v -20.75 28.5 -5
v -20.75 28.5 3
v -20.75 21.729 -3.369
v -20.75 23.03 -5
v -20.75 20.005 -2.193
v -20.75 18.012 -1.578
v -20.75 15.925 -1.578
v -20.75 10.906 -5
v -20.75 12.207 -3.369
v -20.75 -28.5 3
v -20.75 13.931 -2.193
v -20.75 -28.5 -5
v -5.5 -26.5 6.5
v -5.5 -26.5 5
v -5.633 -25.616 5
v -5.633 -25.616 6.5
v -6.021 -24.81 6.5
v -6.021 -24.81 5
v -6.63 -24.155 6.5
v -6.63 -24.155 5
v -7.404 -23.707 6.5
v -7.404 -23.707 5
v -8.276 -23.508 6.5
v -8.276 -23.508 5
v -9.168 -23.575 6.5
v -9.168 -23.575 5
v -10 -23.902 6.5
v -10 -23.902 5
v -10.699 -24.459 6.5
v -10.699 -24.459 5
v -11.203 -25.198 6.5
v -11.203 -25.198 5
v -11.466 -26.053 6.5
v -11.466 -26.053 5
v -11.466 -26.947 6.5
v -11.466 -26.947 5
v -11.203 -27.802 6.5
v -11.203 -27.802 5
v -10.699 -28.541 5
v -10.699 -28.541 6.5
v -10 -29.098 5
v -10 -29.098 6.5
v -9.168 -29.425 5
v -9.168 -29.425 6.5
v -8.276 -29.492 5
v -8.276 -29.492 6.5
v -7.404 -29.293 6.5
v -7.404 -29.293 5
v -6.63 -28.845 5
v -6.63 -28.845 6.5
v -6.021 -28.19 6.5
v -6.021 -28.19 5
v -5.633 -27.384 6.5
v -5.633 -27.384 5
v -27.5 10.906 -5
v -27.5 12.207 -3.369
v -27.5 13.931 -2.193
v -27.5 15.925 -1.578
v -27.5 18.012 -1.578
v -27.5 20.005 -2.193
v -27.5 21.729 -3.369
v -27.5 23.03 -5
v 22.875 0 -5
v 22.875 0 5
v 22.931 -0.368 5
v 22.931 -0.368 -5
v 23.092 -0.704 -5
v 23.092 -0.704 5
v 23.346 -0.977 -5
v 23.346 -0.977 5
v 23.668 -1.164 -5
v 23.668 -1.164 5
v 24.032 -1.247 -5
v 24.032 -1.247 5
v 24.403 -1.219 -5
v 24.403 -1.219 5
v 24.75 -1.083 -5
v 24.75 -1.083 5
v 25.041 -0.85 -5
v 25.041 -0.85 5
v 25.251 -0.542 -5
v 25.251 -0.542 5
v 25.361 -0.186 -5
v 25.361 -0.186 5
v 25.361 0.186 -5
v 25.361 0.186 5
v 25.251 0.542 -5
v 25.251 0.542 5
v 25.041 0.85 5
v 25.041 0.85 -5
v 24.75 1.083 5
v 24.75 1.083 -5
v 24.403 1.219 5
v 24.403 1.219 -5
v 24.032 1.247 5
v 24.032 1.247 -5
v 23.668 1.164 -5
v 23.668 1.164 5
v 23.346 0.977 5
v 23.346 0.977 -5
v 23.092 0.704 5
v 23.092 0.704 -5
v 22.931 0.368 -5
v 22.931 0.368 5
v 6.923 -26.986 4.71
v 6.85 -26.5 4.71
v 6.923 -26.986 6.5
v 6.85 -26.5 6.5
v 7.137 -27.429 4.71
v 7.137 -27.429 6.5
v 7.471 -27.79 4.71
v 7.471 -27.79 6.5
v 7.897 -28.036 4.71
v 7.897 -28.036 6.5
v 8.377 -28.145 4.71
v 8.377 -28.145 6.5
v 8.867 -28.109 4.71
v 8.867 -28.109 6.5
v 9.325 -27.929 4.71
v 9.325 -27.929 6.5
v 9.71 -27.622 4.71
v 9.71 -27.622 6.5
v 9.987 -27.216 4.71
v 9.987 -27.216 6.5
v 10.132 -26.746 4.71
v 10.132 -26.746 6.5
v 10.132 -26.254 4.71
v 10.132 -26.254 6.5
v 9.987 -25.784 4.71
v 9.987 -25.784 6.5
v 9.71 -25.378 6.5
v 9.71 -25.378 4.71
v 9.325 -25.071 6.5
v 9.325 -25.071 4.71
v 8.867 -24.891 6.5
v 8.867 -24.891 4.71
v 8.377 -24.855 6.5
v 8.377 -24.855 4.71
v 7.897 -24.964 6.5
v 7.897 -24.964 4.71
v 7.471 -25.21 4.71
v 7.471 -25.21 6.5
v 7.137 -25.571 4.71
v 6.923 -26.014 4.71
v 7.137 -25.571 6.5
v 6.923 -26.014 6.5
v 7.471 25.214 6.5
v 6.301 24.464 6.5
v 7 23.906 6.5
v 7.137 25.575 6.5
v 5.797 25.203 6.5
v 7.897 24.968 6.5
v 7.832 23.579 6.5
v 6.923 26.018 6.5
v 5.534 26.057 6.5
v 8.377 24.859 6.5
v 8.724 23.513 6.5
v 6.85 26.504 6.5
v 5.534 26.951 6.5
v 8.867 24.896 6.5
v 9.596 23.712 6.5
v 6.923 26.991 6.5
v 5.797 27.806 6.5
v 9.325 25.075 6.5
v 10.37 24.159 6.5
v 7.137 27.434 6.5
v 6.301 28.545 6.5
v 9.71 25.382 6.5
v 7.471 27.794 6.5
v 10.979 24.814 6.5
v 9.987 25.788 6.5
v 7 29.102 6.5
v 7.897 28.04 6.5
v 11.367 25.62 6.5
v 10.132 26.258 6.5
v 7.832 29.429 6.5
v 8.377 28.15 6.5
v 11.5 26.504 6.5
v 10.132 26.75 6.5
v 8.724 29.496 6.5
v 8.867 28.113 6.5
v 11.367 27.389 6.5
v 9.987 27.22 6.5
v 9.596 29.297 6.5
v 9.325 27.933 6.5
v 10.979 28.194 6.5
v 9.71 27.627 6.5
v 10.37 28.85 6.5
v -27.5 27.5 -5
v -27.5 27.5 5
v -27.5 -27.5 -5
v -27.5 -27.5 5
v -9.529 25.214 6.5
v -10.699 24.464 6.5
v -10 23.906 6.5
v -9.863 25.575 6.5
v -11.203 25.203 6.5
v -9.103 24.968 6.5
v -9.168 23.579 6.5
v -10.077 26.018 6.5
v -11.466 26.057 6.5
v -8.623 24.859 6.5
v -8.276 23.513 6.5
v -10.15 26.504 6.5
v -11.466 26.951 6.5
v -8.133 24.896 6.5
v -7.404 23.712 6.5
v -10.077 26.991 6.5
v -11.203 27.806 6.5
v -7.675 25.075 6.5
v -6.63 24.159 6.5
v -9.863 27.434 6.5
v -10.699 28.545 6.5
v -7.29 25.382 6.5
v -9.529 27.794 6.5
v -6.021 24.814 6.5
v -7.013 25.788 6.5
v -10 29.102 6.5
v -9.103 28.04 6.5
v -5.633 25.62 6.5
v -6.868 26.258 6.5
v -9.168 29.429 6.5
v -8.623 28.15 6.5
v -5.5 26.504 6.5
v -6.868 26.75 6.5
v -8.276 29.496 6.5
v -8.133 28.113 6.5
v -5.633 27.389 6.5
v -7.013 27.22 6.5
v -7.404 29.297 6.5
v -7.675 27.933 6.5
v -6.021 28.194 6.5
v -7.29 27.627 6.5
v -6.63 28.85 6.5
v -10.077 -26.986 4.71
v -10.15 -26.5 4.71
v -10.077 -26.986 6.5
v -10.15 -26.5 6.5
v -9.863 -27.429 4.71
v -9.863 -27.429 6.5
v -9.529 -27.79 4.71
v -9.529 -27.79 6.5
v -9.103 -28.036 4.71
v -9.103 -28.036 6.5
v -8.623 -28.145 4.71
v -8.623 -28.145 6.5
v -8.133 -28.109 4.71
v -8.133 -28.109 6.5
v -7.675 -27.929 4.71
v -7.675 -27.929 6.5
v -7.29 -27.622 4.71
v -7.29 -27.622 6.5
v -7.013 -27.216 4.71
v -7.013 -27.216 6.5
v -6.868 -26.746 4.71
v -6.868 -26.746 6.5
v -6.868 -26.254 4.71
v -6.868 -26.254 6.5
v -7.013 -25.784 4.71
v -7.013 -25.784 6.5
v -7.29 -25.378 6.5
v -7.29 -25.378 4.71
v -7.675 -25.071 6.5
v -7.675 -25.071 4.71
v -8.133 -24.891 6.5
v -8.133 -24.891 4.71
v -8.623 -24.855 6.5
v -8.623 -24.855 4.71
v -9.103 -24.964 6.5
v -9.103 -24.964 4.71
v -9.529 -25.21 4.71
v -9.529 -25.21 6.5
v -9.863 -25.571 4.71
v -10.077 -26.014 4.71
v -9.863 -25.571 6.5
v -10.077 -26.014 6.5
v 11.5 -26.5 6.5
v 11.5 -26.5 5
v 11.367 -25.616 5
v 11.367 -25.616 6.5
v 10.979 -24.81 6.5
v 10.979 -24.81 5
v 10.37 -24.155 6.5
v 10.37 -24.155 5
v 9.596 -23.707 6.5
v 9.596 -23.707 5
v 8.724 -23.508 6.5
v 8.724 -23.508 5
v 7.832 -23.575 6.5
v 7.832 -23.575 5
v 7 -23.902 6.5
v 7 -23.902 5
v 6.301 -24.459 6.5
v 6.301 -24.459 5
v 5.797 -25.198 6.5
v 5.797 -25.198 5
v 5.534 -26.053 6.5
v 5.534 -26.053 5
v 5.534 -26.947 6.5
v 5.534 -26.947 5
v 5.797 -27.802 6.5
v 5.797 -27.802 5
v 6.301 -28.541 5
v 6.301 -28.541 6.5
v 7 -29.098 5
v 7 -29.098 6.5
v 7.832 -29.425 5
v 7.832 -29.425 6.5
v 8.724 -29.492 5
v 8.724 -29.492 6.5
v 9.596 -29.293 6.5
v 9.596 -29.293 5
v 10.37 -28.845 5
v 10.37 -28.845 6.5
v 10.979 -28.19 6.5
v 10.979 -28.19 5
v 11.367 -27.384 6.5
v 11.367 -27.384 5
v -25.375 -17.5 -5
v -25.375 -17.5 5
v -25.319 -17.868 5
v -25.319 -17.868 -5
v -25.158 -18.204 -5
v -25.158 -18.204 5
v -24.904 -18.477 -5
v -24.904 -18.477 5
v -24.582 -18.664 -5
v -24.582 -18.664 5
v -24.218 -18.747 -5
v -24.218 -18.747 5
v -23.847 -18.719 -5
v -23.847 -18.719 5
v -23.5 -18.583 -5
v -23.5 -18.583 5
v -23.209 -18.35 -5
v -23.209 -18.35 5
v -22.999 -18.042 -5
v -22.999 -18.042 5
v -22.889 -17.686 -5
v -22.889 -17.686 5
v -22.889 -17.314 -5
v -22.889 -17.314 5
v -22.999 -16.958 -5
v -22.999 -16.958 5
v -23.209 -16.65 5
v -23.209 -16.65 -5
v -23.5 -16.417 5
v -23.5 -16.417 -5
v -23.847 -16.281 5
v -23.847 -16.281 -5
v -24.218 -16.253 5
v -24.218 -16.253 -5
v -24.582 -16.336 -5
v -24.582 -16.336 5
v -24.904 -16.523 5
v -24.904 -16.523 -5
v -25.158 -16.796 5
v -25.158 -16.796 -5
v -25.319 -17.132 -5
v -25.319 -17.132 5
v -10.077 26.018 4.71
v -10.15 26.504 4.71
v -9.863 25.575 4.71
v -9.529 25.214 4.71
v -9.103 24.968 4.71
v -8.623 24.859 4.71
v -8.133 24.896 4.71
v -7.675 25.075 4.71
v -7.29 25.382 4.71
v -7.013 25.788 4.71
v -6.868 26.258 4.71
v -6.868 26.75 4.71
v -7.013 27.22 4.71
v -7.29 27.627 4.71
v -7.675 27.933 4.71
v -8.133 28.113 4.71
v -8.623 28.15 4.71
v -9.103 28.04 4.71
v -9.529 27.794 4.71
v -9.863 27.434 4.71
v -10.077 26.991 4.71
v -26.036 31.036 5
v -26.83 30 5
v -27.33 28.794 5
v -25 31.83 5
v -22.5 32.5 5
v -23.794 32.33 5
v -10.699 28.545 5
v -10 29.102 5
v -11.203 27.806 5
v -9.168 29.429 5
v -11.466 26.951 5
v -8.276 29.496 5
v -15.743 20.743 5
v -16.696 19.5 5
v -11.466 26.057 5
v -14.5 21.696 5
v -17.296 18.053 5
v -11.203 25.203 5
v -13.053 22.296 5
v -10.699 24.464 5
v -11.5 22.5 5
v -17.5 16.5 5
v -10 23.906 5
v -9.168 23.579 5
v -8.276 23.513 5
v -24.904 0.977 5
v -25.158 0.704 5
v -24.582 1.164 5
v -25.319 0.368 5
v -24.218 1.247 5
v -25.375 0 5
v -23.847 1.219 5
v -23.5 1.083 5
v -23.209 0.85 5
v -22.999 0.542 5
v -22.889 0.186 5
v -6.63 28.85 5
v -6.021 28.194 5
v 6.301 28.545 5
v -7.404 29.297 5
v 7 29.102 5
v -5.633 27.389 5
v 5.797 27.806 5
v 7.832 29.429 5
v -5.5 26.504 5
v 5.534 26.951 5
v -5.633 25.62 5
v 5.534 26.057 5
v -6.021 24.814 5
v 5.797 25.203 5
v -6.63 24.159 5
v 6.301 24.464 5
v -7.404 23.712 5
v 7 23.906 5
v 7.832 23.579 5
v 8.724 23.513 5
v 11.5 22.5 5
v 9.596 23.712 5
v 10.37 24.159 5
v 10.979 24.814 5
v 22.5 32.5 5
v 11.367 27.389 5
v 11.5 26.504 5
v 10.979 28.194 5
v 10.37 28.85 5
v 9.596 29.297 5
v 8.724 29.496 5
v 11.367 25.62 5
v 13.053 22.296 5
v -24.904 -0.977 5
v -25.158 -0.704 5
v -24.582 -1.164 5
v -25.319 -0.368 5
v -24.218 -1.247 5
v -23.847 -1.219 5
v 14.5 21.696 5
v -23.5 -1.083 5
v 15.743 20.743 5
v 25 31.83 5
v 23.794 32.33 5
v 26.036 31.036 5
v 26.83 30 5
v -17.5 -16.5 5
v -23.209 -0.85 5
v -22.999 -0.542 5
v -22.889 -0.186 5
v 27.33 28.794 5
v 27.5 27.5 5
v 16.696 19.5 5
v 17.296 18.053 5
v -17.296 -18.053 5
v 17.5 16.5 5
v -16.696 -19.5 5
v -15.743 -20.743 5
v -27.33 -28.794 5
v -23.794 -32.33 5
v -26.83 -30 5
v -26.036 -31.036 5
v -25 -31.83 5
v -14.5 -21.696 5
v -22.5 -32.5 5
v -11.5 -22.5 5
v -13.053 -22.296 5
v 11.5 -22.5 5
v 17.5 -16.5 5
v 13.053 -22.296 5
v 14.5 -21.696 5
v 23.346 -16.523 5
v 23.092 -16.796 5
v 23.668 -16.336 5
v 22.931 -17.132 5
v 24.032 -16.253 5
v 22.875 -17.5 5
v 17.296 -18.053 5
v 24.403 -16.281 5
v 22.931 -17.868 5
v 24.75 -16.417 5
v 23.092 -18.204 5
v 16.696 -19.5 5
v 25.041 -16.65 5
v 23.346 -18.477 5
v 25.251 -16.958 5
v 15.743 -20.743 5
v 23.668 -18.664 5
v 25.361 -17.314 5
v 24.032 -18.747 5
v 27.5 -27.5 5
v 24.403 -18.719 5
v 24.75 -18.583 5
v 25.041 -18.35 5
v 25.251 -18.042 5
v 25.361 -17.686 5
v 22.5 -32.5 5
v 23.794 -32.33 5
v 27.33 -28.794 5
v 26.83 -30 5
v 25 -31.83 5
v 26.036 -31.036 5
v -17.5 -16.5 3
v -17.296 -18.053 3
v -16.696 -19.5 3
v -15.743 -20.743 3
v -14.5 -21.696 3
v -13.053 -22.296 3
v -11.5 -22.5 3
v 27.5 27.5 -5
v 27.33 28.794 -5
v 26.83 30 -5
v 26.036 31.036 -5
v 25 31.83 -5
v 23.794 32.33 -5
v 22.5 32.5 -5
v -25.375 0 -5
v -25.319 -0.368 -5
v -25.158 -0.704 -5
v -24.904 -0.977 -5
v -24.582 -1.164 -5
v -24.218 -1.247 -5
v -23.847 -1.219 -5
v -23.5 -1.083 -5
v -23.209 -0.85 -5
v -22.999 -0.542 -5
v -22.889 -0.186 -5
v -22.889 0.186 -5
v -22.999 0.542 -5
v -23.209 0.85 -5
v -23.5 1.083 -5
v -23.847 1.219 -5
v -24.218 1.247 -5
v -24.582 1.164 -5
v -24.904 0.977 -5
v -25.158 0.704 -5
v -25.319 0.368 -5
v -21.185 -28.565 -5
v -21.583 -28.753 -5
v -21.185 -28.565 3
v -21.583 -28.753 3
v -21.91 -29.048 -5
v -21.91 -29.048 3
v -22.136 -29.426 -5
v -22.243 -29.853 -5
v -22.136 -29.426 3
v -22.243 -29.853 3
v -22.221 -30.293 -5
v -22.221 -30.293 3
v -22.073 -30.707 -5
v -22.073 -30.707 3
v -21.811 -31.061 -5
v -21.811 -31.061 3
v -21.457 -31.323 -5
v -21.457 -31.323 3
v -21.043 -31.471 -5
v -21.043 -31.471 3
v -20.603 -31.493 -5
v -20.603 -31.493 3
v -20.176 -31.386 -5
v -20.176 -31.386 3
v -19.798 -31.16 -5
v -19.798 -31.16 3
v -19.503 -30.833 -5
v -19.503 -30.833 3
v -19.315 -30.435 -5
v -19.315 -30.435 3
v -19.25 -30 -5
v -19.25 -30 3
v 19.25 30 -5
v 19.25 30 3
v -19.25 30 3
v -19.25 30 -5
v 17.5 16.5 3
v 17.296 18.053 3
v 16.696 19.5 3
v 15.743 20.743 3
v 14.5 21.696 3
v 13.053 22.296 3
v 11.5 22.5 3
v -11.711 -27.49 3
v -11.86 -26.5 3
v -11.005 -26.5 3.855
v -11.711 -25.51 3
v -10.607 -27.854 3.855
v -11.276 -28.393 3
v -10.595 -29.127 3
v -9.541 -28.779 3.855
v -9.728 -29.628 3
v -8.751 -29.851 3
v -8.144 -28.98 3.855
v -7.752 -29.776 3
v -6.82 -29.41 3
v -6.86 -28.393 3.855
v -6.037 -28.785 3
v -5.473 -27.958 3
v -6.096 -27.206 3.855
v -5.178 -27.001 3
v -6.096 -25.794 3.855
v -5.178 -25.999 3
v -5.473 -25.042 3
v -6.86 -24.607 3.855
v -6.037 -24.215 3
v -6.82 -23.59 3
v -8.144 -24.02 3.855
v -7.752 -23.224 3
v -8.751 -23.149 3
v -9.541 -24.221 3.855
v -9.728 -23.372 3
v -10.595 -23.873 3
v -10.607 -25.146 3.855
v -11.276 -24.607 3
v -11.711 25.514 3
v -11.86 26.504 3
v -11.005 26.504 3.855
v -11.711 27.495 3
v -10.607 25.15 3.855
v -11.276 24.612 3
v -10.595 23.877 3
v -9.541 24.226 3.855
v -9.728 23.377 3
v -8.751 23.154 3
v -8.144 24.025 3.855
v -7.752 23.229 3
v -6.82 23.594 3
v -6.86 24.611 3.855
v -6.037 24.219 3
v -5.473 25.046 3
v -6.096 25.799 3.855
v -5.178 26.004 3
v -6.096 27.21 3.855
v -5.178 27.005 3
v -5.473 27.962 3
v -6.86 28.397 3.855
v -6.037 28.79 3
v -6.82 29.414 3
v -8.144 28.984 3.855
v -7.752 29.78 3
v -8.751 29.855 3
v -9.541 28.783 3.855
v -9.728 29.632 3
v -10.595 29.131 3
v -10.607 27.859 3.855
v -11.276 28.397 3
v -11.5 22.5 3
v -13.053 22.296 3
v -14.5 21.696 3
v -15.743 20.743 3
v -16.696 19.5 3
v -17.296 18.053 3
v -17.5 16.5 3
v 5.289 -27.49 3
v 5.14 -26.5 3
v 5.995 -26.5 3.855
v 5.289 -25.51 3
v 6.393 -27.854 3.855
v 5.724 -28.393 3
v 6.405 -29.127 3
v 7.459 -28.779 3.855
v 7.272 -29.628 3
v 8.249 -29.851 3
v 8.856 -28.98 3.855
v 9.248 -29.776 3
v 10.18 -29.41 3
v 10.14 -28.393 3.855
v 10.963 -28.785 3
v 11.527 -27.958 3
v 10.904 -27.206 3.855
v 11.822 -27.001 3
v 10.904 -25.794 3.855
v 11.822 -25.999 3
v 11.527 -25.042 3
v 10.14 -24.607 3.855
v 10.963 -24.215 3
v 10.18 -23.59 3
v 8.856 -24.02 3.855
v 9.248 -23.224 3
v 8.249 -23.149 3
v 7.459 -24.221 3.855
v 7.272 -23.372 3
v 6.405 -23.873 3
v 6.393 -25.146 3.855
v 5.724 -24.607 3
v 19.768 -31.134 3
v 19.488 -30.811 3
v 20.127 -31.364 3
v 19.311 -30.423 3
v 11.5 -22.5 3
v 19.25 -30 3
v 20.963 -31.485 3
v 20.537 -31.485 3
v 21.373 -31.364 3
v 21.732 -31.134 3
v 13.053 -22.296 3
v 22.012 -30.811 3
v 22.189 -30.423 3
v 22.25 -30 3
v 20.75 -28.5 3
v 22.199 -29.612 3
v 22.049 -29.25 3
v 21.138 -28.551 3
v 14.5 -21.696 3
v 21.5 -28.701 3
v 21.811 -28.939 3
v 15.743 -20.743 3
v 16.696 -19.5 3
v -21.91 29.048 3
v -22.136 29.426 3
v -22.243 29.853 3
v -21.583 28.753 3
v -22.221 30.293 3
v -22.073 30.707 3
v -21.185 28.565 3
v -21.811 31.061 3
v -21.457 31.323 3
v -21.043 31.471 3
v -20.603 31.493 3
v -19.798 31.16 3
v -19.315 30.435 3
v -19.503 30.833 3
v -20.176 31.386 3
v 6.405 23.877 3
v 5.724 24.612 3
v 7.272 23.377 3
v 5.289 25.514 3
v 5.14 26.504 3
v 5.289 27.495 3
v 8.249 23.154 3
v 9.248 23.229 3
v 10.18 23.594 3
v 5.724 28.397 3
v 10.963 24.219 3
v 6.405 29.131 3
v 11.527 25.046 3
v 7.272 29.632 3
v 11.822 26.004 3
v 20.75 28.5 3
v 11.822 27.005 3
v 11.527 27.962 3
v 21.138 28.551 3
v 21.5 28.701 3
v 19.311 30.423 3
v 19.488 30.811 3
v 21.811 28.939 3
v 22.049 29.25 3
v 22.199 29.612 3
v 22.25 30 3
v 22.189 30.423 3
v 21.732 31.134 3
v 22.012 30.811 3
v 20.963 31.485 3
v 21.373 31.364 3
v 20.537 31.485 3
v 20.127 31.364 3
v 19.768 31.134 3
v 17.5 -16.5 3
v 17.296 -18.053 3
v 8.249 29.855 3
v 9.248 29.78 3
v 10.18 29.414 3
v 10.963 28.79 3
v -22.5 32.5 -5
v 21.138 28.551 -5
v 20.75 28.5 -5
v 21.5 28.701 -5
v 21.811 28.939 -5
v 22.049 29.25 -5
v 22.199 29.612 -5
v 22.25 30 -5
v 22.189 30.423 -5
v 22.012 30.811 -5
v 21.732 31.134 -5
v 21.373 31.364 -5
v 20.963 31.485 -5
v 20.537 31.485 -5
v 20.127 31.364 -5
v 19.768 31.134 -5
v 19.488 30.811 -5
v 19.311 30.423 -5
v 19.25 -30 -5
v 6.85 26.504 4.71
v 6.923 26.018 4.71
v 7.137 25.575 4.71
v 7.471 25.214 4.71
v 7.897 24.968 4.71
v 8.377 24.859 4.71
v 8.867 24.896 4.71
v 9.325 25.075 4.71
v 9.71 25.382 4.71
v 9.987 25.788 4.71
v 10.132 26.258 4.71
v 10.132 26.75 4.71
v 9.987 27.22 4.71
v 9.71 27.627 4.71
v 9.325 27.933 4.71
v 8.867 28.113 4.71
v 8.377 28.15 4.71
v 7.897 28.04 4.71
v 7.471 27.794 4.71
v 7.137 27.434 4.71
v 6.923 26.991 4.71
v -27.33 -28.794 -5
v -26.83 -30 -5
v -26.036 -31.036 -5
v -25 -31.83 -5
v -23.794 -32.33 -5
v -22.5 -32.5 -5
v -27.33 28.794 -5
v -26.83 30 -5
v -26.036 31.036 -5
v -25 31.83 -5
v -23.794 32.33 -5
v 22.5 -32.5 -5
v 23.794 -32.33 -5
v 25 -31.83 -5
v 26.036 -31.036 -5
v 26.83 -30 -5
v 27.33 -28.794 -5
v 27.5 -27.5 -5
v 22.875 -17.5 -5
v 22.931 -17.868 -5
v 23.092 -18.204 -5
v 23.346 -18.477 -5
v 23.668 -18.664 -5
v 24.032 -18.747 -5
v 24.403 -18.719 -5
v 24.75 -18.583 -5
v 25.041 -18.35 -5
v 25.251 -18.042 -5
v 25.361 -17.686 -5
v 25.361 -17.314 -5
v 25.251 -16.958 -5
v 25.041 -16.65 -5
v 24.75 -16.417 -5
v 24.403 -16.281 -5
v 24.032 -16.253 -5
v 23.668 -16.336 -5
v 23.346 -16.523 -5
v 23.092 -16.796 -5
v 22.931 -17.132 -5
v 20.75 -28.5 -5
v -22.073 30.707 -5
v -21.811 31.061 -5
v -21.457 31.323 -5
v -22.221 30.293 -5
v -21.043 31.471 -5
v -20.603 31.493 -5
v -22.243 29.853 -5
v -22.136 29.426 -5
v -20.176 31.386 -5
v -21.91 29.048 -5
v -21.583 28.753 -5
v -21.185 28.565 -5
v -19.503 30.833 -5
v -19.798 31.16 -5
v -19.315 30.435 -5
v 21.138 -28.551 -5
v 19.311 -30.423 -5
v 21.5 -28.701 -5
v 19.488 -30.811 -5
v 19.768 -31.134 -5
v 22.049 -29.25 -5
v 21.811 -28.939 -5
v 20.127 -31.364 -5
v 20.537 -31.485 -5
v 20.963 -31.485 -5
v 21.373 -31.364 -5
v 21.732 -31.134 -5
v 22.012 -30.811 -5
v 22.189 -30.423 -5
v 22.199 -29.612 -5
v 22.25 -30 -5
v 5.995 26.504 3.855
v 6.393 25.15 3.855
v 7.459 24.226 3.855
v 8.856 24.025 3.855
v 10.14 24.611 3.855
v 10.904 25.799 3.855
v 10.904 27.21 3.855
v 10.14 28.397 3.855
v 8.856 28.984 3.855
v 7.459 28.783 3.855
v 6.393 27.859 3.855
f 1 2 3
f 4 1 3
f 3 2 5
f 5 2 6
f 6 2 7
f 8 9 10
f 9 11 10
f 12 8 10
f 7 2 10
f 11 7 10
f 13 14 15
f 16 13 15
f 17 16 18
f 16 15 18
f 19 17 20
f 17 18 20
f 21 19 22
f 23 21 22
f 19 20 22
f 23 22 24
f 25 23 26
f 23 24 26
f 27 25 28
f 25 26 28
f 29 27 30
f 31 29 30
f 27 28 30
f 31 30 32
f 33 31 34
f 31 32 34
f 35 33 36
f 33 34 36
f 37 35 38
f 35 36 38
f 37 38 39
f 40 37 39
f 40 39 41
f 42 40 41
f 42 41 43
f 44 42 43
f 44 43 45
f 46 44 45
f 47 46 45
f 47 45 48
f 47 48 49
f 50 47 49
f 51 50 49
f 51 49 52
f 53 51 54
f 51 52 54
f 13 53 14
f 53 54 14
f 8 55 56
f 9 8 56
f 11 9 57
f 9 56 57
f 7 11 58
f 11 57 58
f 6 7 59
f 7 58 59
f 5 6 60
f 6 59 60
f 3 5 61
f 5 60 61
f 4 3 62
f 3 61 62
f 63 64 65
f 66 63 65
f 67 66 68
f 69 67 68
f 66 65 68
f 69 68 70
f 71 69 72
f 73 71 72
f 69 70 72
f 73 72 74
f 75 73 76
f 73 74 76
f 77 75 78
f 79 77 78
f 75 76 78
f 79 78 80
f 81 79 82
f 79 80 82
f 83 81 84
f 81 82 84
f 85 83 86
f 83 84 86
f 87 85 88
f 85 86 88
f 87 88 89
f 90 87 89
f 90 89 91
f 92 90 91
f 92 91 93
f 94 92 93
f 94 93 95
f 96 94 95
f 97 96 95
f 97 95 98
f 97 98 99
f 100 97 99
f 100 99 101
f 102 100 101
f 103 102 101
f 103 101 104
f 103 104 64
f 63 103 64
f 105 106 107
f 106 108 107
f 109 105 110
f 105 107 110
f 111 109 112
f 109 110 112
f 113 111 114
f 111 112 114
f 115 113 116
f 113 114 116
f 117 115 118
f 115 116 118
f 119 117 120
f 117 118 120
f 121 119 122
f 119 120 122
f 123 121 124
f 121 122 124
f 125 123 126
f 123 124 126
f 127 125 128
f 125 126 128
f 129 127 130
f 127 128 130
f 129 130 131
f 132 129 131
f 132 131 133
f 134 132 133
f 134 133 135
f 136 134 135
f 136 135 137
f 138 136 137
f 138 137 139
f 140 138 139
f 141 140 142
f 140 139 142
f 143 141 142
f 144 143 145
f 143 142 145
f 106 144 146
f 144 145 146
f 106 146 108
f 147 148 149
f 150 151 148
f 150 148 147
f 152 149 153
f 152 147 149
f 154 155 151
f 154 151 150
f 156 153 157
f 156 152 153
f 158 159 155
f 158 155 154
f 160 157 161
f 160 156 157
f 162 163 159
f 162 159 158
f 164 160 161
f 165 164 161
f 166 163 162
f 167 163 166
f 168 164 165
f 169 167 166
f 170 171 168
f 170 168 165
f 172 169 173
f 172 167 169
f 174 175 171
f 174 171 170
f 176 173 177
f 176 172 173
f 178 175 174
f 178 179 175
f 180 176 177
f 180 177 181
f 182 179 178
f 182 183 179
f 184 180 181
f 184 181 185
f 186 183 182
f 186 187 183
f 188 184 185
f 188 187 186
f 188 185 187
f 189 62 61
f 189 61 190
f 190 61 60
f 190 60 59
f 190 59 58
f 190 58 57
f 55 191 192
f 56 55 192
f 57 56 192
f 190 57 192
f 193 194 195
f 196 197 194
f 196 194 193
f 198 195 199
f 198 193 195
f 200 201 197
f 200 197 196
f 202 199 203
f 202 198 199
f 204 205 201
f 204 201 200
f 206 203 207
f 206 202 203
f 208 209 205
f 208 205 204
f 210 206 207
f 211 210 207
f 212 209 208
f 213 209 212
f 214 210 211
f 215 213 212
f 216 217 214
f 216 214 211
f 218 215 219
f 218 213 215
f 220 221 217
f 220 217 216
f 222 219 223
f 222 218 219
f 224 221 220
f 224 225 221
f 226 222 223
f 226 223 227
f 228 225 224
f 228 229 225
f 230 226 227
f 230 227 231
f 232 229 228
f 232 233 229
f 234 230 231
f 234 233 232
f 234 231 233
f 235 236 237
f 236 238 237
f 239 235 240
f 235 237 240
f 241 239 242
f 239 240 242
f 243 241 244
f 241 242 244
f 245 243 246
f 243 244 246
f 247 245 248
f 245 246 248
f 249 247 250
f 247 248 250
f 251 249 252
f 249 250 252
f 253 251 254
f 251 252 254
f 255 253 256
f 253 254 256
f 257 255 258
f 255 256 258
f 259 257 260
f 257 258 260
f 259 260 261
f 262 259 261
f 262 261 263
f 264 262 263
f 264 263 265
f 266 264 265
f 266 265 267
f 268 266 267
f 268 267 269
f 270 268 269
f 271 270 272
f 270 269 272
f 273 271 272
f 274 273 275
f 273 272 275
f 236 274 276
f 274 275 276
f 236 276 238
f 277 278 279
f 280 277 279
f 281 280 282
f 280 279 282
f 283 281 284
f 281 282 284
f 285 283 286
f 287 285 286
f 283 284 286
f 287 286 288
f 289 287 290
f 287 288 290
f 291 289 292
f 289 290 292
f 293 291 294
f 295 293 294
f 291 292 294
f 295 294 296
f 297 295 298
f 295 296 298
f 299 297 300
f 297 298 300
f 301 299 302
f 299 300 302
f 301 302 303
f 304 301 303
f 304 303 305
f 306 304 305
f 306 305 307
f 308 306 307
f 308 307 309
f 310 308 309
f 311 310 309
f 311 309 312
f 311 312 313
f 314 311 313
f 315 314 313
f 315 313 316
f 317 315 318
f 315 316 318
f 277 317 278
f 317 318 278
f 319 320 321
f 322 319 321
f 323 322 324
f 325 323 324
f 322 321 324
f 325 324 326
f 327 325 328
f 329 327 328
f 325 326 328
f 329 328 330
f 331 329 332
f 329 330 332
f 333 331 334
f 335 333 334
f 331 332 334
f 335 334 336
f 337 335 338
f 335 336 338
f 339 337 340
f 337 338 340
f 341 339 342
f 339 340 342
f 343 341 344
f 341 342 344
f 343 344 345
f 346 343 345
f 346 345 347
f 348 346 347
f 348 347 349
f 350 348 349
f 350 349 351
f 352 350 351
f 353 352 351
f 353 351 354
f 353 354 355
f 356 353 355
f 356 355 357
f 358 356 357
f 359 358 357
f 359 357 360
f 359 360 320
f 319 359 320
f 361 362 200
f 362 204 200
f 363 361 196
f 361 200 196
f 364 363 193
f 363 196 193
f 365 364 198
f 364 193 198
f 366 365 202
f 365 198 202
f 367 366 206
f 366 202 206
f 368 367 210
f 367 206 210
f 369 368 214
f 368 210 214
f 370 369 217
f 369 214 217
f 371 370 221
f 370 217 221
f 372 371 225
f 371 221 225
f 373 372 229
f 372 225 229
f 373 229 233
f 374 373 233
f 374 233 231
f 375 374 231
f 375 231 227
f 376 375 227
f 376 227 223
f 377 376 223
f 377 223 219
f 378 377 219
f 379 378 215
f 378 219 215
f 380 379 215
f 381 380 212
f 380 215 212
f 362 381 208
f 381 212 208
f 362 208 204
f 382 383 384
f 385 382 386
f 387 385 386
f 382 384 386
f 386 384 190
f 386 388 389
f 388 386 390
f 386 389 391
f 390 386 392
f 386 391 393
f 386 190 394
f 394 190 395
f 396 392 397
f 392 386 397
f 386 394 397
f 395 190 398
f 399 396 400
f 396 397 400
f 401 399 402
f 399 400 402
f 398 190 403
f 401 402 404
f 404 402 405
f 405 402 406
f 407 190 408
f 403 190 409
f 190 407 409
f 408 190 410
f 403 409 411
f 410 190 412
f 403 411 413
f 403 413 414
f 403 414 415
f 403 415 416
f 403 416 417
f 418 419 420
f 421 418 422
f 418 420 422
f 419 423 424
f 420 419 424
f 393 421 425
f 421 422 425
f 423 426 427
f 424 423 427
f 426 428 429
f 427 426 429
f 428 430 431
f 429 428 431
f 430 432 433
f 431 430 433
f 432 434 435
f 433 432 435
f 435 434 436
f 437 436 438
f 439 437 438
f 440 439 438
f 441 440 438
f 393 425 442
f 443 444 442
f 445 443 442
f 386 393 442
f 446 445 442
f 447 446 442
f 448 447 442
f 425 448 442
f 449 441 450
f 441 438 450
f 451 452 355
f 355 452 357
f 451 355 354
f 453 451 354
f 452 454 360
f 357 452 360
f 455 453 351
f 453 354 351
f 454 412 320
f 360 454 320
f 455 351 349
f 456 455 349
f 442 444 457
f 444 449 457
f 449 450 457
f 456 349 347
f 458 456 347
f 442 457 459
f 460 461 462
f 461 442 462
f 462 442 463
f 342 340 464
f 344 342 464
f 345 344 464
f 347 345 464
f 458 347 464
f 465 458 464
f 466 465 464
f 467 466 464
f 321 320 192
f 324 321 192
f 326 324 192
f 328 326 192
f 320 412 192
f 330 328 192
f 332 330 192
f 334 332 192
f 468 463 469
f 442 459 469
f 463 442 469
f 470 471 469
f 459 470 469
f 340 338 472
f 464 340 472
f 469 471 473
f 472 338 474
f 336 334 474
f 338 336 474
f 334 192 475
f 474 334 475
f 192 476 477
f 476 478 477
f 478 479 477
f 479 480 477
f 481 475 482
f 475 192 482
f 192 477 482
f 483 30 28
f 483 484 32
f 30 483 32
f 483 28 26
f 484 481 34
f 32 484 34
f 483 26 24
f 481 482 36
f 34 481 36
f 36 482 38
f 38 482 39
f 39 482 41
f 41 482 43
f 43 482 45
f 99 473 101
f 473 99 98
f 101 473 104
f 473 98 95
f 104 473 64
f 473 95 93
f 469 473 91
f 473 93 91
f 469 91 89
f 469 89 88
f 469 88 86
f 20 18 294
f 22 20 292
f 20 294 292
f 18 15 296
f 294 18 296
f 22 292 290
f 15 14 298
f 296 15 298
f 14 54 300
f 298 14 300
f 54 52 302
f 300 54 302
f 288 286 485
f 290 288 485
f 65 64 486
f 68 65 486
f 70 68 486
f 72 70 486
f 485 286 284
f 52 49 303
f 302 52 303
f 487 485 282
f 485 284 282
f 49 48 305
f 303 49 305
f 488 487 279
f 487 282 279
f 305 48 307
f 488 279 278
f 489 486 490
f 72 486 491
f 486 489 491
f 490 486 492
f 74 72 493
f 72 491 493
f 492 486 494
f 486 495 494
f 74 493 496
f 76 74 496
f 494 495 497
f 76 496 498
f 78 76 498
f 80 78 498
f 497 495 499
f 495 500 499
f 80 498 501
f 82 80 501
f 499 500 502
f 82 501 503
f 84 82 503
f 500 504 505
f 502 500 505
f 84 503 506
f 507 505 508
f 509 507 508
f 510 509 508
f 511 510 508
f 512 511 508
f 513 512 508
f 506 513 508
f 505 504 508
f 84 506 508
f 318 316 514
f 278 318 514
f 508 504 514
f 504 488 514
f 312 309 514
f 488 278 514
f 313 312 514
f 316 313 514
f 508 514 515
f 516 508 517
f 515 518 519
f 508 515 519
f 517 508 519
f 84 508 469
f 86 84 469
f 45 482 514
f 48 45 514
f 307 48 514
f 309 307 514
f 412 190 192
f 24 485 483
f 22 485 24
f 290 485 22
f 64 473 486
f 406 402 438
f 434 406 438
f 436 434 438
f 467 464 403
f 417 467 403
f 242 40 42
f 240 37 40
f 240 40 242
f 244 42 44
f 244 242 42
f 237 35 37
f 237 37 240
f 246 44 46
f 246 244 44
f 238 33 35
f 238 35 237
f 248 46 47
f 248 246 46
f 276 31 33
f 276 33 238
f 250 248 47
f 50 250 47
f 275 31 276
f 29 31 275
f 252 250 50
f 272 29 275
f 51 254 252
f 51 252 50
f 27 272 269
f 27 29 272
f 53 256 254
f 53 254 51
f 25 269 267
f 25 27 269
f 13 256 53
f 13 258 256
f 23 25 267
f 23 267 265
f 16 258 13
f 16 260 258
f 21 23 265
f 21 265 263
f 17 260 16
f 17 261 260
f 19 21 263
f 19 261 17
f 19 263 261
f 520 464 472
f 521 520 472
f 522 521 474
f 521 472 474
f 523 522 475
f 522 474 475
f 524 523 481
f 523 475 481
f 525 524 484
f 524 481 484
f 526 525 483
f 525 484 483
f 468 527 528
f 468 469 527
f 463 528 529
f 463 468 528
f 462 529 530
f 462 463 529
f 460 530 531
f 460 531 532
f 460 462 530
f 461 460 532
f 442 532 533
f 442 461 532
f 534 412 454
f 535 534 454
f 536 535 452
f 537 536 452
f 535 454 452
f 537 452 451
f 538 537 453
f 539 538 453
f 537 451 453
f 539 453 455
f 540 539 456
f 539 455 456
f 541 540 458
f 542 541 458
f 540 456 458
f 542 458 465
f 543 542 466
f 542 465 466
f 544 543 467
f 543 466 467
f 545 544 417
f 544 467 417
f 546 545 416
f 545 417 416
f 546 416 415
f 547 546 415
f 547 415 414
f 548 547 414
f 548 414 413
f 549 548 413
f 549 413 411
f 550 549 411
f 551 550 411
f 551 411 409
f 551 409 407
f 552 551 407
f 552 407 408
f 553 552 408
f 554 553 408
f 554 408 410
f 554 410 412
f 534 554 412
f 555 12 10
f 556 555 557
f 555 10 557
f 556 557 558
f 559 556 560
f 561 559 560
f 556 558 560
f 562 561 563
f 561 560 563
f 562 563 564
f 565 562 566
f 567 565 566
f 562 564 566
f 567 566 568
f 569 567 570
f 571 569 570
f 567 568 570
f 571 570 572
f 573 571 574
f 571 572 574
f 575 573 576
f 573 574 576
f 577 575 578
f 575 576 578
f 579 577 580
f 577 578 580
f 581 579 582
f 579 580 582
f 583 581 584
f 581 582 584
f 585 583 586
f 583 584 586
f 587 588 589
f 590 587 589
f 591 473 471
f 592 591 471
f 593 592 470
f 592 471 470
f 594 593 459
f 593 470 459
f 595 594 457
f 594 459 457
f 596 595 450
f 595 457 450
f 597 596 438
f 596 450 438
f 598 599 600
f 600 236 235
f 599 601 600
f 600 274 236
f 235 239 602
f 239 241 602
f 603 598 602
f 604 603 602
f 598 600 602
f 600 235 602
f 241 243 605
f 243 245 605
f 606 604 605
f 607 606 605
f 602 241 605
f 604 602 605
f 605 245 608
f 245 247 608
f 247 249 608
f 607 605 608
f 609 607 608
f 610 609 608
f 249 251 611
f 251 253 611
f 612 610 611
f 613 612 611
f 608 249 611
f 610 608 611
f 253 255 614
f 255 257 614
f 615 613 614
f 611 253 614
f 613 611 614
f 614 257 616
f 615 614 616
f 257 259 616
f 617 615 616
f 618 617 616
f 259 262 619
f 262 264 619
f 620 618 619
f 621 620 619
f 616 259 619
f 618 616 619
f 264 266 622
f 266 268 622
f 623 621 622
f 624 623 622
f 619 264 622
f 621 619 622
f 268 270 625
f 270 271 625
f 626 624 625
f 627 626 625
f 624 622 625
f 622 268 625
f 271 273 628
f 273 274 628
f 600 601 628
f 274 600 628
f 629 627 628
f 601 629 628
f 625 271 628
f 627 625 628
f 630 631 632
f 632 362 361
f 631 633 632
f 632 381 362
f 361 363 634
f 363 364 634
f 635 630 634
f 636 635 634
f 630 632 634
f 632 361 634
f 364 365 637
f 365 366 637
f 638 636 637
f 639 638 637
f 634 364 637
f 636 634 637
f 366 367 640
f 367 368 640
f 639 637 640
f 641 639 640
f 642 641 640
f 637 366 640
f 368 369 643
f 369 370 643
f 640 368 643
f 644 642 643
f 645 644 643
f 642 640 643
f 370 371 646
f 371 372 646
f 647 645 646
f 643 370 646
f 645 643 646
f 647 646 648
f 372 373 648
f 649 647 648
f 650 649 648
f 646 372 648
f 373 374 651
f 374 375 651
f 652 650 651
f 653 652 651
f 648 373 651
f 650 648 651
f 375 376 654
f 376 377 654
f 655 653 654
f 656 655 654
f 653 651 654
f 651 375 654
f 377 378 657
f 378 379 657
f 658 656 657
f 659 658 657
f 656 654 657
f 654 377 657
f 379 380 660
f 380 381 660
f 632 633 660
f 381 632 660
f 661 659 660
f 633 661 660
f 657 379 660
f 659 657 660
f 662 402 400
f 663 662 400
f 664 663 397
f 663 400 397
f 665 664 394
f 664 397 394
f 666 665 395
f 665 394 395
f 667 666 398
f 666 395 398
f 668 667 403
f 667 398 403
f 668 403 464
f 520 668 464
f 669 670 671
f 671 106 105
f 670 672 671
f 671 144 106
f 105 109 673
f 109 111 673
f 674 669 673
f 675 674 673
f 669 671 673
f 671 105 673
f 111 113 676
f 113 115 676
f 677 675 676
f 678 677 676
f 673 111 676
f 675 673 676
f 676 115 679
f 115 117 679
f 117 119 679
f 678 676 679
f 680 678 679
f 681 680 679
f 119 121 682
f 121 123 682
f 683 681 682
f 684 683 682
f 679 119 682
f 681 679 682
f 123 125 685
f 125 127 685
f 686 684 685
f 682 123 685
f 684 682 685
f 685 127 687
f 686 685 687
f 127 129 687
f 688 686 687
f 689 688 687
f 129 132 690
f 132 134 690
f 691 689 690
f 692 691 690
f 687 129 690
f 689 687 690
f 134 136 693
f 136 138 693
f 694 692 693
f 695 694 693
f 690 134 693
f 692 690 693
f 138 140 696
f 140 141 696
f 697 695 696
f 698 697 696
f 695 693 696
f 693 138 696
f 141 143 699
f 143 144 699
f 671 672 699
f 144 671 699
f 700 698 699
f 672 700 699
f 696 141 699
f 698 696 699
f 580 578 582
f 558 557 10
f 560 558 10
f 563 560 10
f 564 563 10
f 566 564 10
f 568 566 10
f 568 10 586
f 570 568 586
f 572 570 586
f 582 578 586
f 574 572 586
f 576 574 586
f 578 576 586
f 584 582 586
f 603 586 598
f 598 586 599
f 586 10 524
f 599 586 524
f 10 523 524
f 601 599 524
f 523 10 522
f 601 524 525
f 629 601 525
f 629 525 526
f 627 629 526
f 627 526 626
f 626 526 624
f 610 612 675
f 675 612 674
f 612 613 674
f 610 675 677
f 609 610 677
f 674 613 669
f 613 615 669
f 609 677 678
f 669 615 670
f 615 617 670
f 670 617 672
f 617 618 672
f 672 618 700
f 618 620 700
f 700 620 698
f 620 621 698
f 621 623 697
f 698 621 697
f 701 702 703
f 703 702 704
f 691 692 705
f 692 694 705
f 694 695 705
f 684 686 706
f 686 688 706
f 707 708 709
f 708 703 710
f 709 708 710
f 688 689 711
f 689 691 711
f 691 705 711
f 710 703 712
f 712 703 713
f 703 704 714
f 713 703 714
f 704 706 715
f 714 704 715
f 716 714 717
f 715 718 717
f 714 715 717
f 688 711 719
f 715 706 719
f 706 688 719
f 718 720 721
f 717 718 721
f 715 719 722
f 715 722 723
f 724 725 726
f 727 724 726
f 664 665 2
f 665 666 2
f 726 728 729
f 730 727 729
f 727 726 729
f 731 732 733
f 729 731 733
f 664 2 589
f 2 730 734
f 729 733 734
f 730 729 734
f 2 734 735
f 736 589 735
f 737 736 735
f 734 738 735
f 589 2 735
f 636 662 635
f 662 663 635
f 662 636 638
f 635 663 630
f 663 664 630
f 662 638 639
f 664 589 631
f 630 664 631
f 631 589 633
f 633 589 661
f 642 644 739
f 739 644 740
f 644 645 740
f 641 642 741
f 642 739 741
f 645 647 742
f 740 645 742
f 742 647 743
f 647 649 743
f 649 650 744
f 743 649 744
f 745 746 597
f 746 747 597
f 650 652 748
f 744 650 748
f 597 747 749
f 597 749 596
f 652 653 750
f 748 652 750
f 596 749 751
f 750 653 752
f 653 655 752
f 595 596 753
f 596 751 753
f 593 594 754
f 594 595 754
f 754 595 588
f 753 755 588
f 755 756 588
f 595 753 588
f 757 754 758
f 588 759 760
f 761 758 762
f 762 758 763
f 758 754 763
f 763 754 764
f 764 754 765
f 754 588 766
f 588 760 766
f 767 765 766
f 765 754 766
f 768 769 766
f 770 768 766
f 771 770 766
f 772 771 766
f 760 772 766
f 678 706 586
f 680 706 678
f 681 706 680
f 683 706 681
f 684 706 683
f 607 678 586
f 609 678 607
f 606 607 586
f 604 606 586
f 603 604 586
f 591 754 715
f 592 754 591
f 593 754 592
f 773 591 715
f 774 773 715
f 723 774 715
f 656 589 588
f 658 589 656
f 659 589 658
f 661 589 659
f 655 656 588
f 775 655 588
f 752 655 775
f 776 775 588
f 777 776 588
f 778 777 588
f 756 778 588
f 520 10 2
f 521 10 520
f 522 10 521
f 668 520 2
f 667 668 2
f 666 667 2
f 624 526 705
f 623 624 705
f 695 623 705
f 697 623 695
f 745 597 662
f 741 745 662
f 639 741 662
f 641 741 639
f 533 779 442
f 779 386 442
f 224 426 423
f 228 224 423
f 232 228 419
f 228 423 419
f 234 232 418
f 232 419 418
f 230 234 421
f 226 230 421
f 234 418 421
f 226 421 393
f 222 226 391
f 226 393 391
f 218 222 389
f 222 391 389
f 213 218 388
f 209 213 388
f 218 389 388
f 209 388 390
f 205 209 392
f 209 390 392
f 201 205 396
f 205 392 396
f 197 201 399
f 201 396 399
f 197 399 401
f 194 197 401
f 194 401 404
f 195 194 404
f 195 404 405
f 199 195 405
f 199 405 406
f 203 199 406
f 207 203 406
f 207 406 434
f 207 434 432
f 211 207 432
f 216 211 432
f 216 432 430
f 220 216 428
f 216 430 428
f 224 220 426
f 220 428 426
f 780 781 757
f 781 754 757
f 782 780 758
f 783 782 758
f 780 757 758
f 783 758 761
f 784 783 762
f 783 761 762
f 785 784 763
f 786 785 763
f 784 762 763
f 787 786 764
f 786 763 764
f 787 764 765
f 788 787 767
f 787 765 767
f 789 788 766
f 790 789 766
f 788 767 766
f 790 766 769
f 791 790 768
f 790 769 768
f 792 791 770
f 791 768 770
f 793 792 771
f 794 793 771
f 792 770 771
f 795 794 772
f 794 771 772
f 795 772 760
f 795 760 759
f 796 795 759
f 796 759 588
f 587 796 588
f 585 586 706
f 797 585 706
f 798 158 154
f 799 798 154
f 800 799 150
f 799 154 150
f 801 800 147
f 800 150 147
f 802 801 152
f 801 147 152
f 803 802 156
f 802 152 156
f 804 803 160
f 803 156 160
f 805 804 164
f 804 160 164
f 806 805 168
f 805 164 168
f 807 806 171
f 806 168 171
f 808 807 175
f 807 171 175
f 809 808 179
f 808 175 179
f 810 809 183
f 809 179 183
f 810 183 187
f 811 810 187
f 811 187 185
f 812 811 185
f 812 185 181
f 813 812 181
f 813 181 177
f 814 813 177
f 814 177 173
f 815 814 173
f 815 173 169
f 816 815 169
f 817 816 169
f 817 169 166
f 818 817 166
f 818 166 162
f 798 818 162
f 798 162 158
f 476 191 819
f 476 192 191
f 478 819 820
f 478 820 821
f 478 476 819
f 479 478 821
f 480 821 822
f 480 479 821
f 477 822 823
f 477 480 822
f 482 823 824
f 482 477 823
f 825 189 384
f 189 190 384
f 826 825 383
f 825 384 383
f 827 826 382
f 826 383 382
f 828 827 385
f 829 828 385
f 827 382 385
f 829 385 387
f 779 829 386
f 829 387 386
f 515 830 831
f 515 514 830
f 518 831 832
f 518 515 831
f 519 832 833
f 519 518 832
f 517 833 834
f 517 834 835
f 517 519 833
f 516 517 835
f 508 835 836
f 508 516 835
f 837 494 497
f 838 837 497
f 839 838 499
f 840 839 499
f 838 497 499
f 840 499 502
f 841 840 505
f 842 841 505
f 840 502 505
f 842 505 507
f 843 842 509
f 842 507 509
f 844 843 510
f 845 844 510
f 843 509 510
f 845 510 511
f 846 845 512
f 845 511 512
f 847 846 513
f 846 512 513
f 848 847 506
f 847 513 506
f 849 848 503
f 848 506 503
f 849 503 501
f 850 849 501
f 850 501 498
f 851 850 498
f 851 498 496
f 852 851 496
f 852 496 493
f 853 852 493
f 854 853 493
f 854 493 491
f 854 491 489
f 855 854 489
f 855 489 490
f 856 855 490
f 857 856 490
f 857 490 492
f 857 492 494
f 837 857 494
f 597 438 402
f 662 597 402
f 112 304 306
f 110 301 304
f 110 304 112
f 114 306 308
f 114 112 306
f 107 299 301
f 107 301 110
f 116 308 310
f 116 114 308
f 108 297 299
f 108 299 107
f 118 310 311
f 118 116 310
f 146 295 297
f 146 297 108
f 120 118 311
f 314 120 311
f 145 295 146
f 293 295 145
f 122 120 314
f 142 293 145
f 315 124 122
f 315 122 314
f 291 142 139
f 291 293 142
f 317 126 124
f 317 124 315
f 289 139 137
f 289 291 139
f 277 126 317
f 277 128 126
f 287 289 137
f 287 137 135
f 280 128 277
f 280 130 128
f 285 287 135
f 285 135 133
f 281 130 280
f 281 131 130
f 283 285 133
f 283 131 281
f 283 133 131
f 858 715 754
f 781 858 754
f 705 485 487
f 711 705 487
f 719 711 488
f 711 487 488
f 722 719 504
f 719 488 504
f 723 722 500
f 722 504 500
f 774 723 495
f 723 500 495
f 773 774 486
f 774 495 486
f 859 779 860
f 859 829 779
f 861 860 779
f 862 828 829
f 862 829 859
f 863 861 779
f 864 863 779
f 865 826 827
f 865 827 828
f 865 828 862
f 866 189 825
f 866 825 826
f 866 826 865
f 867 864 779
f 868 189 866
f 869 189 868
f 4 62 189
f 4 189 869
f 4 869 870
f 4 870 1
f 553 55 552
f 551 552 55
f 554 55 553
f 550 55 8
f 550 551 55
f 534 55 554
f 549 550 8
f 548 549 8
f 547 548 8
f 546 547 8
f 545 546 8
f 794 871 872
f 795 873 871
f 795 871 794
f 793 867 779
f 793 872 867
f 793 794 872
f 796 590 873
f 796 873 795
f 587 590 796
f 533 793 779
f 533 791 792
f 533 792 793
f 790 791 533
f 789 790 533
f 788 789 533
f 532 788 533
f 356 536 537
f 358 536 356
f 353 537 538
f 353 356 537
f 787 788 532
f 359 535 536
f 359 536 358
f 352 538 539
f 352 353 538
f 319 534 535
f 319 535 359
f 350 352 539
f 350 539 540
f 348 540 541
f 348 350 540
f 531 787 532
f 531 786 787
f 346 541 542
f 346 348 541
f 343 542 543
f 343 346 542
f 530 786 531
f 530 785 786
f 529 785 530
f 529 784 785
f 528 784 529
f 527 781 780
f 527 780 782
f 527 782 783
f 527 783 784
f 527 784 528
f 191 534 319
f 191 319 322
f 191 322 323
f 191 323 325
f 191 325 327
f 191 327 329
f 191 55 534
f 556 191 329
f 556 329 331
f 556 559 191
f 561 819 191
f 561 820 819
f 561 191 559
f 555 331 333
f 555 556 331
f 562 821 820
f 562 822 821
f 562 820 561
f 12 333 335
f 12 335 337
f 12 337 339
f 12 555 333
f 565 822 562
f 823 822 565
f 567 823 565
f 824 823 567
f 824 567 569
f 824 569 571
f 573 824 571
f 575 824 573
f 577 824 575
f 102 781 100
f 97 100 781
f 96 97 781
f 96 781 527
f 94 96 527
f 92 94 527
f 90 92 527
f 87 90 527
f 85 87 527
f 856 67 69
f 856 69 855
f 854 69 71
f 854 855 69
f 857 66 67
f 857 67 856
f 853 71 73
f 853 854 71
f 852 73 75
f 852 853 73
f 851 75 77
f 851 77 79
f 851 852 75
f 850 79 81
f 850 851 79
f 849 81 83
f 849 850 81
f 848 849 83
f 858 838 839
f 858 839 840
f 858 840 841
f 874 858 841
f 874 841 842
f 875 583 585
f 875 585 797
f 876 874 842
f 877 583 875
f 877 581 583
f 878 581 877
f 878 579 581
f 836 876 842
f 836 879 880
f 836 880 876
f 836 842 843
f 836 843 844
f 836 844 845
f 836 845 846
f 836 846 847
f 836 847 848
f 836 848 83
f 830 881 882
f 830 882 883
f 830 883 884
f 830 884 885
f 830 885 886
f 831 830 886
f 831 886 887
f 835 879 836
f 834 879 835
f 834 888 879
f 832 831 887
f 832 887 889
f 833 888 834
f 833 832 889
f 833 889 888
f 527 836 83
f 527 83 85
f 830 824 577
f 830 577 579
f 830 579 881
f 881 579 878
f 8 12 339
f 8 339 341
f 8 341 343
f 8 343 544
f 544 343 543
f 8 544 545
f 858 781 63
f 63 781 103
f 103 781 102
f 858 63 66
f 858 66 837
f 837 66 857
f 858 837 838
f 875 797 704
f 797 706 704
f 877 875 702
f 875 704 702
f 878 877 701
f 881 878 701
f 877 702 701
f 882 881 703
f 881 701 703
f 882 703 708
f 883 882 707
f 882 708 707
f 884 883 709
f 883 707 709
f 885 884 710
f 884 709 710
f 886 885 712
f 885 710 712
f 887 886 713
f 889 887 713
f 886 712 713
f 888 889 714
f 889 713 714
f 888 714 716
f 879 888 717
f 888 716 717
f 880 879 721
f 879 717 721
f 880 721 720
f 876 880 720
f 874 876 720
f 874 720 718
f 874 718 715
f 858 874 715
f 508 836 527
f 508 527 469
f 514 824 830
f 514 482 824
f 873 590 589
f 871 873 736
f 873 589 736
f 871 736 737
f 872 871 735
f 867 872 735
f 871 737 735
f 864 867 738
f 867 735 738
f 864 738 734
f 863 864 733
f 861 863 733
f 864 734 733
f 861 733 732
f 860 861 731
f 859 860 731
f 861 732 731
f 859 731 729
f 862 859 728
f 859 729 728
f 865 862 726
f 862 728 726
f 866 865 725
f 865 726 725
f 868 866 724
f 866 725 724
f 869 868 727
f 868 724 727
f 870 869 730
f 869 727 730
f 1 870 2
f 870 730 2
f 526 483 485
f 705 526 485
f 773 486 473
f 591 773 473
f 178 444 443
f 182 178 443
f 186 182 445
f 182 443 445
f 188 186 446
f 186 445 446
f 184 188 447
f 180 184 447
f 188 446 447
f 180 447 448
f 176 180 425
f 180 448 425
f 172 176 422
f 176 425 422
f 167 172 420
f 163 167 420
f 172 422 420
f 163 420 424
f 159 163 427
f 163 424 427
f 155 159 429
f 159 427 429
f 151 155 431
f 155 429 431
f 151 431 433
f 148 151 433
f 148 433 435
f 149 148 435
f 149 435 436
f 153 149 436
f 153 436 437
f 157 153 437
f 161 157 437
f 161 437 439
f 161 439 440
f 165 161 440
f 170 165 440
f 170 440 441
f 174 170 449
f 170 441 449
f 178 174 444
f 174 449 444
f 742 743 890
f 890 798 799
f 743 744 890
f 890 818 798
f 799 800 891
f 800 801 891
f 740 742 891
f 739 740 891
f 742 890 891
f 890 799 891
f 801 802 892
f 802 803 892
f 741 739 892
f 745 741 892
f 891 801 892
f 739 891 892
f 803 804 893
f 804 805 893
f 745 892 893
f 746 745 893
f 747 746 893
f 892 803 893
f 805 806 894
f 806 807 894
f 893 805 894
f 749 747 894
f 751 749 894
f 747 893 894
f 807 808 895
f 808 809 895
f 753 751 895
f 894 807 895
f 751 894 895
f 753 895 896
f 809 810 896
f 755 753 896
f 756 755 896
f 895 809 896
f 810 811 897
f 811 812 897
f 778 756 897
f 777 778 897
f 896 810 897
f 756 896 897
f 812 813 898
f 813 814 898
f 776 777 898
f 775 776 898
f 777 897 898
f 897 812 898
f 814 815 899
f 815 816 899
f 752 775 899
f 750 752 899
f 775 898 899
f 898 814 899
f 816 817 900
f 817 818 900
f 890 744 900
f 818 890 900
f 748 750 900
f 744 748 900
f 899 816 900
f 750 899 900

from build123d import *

# Parameters (mm, degrees)
F0_W            = 55
F0_H            = 10
F1_DEPTH        = 32.5
F3_R            = 5
F4_DEPTH        = 12.5
F6_DEPTH        = 30
F7_DEPTH        = 3
F9_D            = 3.3
F9_CSINK_D      = 6.72
F9_CSINK_ANGLE  = 90
F10_R           = 3
F11_DEPTH       = 1.5
F12_D           = 3.3
F12_DEPTH       = 13.5
F12_CSINK_D     = 6.72
F12_CSINK_ANGLE = 90
F12_TIP         = 0.9914200214
F14_D           = 2.5
F14_DEPTH       = 13.5
F14_TIP         = 0.7510757738
F16_DEPTH       = 12


with BuildPart() as f1:
    # F0 (on Front) → F1 (new body, symmetric)
    with BuildSketch(Plane.XZ):
        Rectangle(F0_W, F0_H)
    extrude(amount=F1_DEPTH, both=True)

    # F3
    f3_edges = [f1.edges().sort_by_distance(p)[0] for p in [
        (27.5, -32.5, 0),
        (-27.5, -32.5, 0),
        (-27.5, 32.5, 0),
        (27.5, 32.5, 0),
    ]]
    fillet(f3_edges, radius=F3_R)

    # F2 (on Top) → F4 (cut, symmetric)
    with BuildSketch(Plane.XY):
        with BuildLine():
            Line((-11.5, -22.5), (11.5, -22.5))
            ThreePointArc((11.5, -22.5), (15.7426406871, -20.7426406871), (17.5, -16.5))
            Line((17.5, -16.5), (17.5, 16.5))
            ThreePointArc((17.5, 16.5), (15.7426406871, 20.7426406871), (11.5, 22.5))
            Line((11.5, 22.5), (-11.5, 22.5))
            ThreePointArc((-11.5, 22.5), (-15.7426406871, 20.7426406871), (-17.5, 16.5))
            Line((-17.5, 16.5), (-17.5, -16.5))
            ThreePointArc((-17.5, -16.5), (-15.7426406871, -20.7426406871), (-11.5, -22.5))
        make_face()
    extrude(amount=F4_DEPTH, both=True, mode=Mode.SUBTRACT)

    # F5 (on Top) → F6 (cut)
    with BuildSketch(Plane.XY):
        with BuildLine():
            ThreePointArc((-20.75, -28.5), (-21.8106601718, -31.0606601718), (-19.25, -30))
            Line((-19.25, -30), (-20.75, -30))
            Line((-20.75, -30), (-20.75, -28.5))
        make_face()
        with BuildLine():
            ThreePointArc((-20.75, -28.5), (-19.6893398282, -28.9393398282), (-19.25, -30))
            Line((-19.25, -30), (19.25, -30))
            ThreePointArc((19.25, -30), (19.6893398282, -28.9393398282), (20.75, -28.5))
            Line((20.75, -28.5), (20.75, 28.5))
            ThreePointArc((20.75, 28.5), (19.6893398282, 28.9393398282), (19.25, 30))
            Line((19.25, 30), (-19.25, 30))
            ThreePointArc((-19.25, 30), (-19.6893398282, 28.9393398282), (-20.75, 28.5))
            Line((-20.75, 28.5), (-20.75, -28.5))
        make_face()
        with BuildLine():
            Line((-20.75, -30), (-19.25, -30))
            ThreePointArc((-19.25, -30), (-19.6893398282, -28.9393398282), (-20.75, -28.5))
            Line((-20.75, -28.5), (-20.75, -30))
        make_face()
        with BuildLine():
            ThreePointArc((20.75, -28.5), (19.6893398282, -28.9393398282), (19.25, -30))
            Line((19.25, -30), (20.75, -30))
            Line((20.75, -30), (20.75, -28.5))
        make_face()
        with BuildLine():
            Line((20.75, -30), (19.25, -30))
            ThreePointArc((19.25, -30), (20.75, -31.5), (22.25, -30))
            ThreePointArc((22.25, -30), (21.8106601718, -28.9393398282), (20.75, -28.5))
            Line((20.75, -28.5), (20.75, -30))
        make_face()
        with BuildLine():
            ThreePointArc((-19.25, 30), (-21.8106601718, 31.0606601718), (-20.75, 28.5))
            Line((-20.75, 28.5), (-20.75, 30))
            Line((-20.75, 30), (-19.25, 30))
        make_face()
        with BuildLine():
            Line((-20.75, 30), (-20.75, 28.5))
            ThreePointArc((-20.75, 28.5), (-19.6893398282, 28.9393398282), (-19.25, 30))
            Line((-19.25, 30), (-20.75, 30))
        make_face()
        with BuildLine():
            ThreePointArc((19.25, 30), (19.6893398282, 28.9393398282), (20.75, 28.5))
            Line((20.75, 28.5), (20.75, 30))
            Line((20.75, 30), (19.25, 30))
        make_face()
        with BuildLine():
            Line((20.75, 30), (20.75, 28.5))
            ThreePointArc((20.75, 28.5), (21.8106601718, 28.9393398282), (22.25, 30))
            ThreePointArc((22.25, 30), (20.75, 31.5), (19.25, 30))
            Line((19.25, 30), (20.75, 30))
        make_face()
    extrude(amount=-F6_DEPTH, mode=Mode.SUBTRACT)

    # F5 (on Top) → F7 (cut)
    with BuildSketch(Plane.XY):
        with BuildLine():
            ThreePointArc((-20.75, -28.5), (-21.8106601718, -31.0606601718), (-19.25, -30))
            Line((-19.25, -30), (-20.75, -30))
            Line((-20.75, -30), (-20.75, -28.5))
        make_face()
        with BuildLine():
            ThreePointArc((-20.75, -28.5), (-19.6893398282, -28.9393398282), (-19.25, -30))
            Line((-19.25, -30), (19.25, -30))
            ThreePointArc((19.25, -30), (19.6893398282, -28.9393398282), (20.75, -28.5))
            Line((20.75, -28.5), (20.75, 28.5))
            ThreePointArc((20.75, 28.5), (19.6893398282, 28.9393398282), (19.25, 30))
            Line((19.25, 30), (-19.25, 30))
            ThreePointArc((-19.25, 30), (-19.6893398282, 28.9393398282), (-20.75, 28.5))
            Line((-20.75, 28.5), (-20.75, -28.5))
        make_face()
        with BuildLine():
            Line((-20.75, -30), (-19.25, -30))
            ThreePointArc((-19.25, -30), (-19.6893398282, -28.9393398282), (-20.75, -28.5))
            Line((-20.75, -28.5), (-20.75, -30))
        make_face()
        with BuildLine():
            ThreePointArc((20.75, -28.5), (19.6893398282, -28.9393398282), (19.25, -30))
            Line((19.25, -30), (20.75, -30))
            Line((20.75, -30), (20.75, -28.5))
        make_face()
        with BuildLine():
            Line((20.75, -30), (19.25, -30))
            ThreePointArc((19.25, -30), (20.75, -31.5), (22.25, -30))
            ThreePointArc((22.25, -30), (21.8106601718, -28.9393398282), (20.75, -28.5))
            Line((20.75, -28.5), (20.75, -30))
        make_face()
        with BuildLine():
            ThreePointArc((-19.25, 30), (-21.8106601718, 31.0606601718), (-20.75, 28.5))
            Line((-20.75, 28.5), (-20.75, 30))
            Line((-20.75, 30), (-19.25, 30))
        make_face()
        with BuildLine():
            Line((-20.75, 30), (-20.75, 28.5))
            ThreePointArc((-20.75, 28.5), (-19.6893398282, 28.9393398282), (-19.25, 30))
            Line((-19.25, 30), (-20.75, 30))
        make_face()
        with BuildLine():
            ThreePointArc((19.25, 30), (19.6893398282, 28.9393398282), (20.75, 28.5))
            Line((20.75, 28.5), (20.75, 30))
            Line((20.75, 30), (19.25, 30))
        make_face()
        with BuildLine():
            Line((20.75, 30), (20.75, 28.5))
            ThreePointArc((20.75, 28.5), (21.8106601718, 28.9393398282), (22.25, 30))
            ThreePointArc((22.25, 30), (20.75, 31.5), (19.25, 30))
            Line((19.25, 30), (20.75, 30))
        make_face()
    extrude(amount=F7_DEPTH, mode=Mode.SUBTRACT)

    # F9 (through all)
    with Locations(Plane(origin=(0, 0, 3), x_dir=(1, 0, 0), z_dir=(0, 0, -1))):
        with Locations((-8.5, -26.5042820722), (8.5, -26.5042820722)):
            CounterSinkHole(F9_D / 2, F9_CSINK_D / 2, counter_sink_angle=F9_CSINK_ANGLE)

    # F10 (on face) → F11 (join)
    with BuildSketch(Plane.XY.offset(5)):
        with Locations((8.5, 26.5042820722)):
            Circle(F10_R)
        with Locations((-8.5, 26.5042820722)):
            Circle(F10_R)
        with Locations((-8.5, -26.5)):
            Circle(F10_R)
        with Locations((8.5, -26.5)):
            Circle(F10_R)
    extrude(amount=F11_DEPTH)

    # F12
    with Locations(Plane(origin=(0, 0, 3), x_dir=(1, 0, 0), z_dir=(0, 0, -1))):
        with Locations((-8.5, -26.5042820722), (8.5, -26.5042820722), (8.5, 26.5), (-8.5, 26.5)):
            CounterSinkHole(F12_D / 2, F12_CSINK_D / 2, depth=F12_DEPTH, counter_sink_angle=F12_CSINK_ANGLE)
            with Locations((0, 0, -(F12_DEPTH + F12_TIP / 2))):  # 118° drill point
                Cone(0, F12_D / 2, F12_TIP, mode=Mode.SUBTRACT)

    # F14
    with Locations(Plane(origin=(0, 0, -5), x_dir=(1, 0, 0), z_dir=(0, 0, -1))):
        with Locations((-24.125, 0), (24.125, 0), (-24.125, 17.5), (24.125, 17.5)):
            Hole(F14_D / 2, depth=F14_DEPTH)
            with Locations((0, 0, -(F14_DEPTH + F14_TIP / 2))):  # 118° drill point
                Cone(0, F14_D / 2, F14_TIP, mode=Mode.SUBTRACT)

    # F15 (on face) → F16 (cut)
    with BuildSketch(Plane(origin=(-27.5, 0, 0), x_dir=(0, -1, 0), z_dir=(-1, 0, 0))):
        with BuildLine():
            Line((-23.0304132, -5), (-10.906057547, -5))
            ThreePointArc((-10.906057547, -5), (-16.9682353735, -1.5), (-23.0304132, -5))
        make_face()
    extrude(amount=-F16_DEPTH, mode=Mode.SUBTRACT)


solid = f1.part
